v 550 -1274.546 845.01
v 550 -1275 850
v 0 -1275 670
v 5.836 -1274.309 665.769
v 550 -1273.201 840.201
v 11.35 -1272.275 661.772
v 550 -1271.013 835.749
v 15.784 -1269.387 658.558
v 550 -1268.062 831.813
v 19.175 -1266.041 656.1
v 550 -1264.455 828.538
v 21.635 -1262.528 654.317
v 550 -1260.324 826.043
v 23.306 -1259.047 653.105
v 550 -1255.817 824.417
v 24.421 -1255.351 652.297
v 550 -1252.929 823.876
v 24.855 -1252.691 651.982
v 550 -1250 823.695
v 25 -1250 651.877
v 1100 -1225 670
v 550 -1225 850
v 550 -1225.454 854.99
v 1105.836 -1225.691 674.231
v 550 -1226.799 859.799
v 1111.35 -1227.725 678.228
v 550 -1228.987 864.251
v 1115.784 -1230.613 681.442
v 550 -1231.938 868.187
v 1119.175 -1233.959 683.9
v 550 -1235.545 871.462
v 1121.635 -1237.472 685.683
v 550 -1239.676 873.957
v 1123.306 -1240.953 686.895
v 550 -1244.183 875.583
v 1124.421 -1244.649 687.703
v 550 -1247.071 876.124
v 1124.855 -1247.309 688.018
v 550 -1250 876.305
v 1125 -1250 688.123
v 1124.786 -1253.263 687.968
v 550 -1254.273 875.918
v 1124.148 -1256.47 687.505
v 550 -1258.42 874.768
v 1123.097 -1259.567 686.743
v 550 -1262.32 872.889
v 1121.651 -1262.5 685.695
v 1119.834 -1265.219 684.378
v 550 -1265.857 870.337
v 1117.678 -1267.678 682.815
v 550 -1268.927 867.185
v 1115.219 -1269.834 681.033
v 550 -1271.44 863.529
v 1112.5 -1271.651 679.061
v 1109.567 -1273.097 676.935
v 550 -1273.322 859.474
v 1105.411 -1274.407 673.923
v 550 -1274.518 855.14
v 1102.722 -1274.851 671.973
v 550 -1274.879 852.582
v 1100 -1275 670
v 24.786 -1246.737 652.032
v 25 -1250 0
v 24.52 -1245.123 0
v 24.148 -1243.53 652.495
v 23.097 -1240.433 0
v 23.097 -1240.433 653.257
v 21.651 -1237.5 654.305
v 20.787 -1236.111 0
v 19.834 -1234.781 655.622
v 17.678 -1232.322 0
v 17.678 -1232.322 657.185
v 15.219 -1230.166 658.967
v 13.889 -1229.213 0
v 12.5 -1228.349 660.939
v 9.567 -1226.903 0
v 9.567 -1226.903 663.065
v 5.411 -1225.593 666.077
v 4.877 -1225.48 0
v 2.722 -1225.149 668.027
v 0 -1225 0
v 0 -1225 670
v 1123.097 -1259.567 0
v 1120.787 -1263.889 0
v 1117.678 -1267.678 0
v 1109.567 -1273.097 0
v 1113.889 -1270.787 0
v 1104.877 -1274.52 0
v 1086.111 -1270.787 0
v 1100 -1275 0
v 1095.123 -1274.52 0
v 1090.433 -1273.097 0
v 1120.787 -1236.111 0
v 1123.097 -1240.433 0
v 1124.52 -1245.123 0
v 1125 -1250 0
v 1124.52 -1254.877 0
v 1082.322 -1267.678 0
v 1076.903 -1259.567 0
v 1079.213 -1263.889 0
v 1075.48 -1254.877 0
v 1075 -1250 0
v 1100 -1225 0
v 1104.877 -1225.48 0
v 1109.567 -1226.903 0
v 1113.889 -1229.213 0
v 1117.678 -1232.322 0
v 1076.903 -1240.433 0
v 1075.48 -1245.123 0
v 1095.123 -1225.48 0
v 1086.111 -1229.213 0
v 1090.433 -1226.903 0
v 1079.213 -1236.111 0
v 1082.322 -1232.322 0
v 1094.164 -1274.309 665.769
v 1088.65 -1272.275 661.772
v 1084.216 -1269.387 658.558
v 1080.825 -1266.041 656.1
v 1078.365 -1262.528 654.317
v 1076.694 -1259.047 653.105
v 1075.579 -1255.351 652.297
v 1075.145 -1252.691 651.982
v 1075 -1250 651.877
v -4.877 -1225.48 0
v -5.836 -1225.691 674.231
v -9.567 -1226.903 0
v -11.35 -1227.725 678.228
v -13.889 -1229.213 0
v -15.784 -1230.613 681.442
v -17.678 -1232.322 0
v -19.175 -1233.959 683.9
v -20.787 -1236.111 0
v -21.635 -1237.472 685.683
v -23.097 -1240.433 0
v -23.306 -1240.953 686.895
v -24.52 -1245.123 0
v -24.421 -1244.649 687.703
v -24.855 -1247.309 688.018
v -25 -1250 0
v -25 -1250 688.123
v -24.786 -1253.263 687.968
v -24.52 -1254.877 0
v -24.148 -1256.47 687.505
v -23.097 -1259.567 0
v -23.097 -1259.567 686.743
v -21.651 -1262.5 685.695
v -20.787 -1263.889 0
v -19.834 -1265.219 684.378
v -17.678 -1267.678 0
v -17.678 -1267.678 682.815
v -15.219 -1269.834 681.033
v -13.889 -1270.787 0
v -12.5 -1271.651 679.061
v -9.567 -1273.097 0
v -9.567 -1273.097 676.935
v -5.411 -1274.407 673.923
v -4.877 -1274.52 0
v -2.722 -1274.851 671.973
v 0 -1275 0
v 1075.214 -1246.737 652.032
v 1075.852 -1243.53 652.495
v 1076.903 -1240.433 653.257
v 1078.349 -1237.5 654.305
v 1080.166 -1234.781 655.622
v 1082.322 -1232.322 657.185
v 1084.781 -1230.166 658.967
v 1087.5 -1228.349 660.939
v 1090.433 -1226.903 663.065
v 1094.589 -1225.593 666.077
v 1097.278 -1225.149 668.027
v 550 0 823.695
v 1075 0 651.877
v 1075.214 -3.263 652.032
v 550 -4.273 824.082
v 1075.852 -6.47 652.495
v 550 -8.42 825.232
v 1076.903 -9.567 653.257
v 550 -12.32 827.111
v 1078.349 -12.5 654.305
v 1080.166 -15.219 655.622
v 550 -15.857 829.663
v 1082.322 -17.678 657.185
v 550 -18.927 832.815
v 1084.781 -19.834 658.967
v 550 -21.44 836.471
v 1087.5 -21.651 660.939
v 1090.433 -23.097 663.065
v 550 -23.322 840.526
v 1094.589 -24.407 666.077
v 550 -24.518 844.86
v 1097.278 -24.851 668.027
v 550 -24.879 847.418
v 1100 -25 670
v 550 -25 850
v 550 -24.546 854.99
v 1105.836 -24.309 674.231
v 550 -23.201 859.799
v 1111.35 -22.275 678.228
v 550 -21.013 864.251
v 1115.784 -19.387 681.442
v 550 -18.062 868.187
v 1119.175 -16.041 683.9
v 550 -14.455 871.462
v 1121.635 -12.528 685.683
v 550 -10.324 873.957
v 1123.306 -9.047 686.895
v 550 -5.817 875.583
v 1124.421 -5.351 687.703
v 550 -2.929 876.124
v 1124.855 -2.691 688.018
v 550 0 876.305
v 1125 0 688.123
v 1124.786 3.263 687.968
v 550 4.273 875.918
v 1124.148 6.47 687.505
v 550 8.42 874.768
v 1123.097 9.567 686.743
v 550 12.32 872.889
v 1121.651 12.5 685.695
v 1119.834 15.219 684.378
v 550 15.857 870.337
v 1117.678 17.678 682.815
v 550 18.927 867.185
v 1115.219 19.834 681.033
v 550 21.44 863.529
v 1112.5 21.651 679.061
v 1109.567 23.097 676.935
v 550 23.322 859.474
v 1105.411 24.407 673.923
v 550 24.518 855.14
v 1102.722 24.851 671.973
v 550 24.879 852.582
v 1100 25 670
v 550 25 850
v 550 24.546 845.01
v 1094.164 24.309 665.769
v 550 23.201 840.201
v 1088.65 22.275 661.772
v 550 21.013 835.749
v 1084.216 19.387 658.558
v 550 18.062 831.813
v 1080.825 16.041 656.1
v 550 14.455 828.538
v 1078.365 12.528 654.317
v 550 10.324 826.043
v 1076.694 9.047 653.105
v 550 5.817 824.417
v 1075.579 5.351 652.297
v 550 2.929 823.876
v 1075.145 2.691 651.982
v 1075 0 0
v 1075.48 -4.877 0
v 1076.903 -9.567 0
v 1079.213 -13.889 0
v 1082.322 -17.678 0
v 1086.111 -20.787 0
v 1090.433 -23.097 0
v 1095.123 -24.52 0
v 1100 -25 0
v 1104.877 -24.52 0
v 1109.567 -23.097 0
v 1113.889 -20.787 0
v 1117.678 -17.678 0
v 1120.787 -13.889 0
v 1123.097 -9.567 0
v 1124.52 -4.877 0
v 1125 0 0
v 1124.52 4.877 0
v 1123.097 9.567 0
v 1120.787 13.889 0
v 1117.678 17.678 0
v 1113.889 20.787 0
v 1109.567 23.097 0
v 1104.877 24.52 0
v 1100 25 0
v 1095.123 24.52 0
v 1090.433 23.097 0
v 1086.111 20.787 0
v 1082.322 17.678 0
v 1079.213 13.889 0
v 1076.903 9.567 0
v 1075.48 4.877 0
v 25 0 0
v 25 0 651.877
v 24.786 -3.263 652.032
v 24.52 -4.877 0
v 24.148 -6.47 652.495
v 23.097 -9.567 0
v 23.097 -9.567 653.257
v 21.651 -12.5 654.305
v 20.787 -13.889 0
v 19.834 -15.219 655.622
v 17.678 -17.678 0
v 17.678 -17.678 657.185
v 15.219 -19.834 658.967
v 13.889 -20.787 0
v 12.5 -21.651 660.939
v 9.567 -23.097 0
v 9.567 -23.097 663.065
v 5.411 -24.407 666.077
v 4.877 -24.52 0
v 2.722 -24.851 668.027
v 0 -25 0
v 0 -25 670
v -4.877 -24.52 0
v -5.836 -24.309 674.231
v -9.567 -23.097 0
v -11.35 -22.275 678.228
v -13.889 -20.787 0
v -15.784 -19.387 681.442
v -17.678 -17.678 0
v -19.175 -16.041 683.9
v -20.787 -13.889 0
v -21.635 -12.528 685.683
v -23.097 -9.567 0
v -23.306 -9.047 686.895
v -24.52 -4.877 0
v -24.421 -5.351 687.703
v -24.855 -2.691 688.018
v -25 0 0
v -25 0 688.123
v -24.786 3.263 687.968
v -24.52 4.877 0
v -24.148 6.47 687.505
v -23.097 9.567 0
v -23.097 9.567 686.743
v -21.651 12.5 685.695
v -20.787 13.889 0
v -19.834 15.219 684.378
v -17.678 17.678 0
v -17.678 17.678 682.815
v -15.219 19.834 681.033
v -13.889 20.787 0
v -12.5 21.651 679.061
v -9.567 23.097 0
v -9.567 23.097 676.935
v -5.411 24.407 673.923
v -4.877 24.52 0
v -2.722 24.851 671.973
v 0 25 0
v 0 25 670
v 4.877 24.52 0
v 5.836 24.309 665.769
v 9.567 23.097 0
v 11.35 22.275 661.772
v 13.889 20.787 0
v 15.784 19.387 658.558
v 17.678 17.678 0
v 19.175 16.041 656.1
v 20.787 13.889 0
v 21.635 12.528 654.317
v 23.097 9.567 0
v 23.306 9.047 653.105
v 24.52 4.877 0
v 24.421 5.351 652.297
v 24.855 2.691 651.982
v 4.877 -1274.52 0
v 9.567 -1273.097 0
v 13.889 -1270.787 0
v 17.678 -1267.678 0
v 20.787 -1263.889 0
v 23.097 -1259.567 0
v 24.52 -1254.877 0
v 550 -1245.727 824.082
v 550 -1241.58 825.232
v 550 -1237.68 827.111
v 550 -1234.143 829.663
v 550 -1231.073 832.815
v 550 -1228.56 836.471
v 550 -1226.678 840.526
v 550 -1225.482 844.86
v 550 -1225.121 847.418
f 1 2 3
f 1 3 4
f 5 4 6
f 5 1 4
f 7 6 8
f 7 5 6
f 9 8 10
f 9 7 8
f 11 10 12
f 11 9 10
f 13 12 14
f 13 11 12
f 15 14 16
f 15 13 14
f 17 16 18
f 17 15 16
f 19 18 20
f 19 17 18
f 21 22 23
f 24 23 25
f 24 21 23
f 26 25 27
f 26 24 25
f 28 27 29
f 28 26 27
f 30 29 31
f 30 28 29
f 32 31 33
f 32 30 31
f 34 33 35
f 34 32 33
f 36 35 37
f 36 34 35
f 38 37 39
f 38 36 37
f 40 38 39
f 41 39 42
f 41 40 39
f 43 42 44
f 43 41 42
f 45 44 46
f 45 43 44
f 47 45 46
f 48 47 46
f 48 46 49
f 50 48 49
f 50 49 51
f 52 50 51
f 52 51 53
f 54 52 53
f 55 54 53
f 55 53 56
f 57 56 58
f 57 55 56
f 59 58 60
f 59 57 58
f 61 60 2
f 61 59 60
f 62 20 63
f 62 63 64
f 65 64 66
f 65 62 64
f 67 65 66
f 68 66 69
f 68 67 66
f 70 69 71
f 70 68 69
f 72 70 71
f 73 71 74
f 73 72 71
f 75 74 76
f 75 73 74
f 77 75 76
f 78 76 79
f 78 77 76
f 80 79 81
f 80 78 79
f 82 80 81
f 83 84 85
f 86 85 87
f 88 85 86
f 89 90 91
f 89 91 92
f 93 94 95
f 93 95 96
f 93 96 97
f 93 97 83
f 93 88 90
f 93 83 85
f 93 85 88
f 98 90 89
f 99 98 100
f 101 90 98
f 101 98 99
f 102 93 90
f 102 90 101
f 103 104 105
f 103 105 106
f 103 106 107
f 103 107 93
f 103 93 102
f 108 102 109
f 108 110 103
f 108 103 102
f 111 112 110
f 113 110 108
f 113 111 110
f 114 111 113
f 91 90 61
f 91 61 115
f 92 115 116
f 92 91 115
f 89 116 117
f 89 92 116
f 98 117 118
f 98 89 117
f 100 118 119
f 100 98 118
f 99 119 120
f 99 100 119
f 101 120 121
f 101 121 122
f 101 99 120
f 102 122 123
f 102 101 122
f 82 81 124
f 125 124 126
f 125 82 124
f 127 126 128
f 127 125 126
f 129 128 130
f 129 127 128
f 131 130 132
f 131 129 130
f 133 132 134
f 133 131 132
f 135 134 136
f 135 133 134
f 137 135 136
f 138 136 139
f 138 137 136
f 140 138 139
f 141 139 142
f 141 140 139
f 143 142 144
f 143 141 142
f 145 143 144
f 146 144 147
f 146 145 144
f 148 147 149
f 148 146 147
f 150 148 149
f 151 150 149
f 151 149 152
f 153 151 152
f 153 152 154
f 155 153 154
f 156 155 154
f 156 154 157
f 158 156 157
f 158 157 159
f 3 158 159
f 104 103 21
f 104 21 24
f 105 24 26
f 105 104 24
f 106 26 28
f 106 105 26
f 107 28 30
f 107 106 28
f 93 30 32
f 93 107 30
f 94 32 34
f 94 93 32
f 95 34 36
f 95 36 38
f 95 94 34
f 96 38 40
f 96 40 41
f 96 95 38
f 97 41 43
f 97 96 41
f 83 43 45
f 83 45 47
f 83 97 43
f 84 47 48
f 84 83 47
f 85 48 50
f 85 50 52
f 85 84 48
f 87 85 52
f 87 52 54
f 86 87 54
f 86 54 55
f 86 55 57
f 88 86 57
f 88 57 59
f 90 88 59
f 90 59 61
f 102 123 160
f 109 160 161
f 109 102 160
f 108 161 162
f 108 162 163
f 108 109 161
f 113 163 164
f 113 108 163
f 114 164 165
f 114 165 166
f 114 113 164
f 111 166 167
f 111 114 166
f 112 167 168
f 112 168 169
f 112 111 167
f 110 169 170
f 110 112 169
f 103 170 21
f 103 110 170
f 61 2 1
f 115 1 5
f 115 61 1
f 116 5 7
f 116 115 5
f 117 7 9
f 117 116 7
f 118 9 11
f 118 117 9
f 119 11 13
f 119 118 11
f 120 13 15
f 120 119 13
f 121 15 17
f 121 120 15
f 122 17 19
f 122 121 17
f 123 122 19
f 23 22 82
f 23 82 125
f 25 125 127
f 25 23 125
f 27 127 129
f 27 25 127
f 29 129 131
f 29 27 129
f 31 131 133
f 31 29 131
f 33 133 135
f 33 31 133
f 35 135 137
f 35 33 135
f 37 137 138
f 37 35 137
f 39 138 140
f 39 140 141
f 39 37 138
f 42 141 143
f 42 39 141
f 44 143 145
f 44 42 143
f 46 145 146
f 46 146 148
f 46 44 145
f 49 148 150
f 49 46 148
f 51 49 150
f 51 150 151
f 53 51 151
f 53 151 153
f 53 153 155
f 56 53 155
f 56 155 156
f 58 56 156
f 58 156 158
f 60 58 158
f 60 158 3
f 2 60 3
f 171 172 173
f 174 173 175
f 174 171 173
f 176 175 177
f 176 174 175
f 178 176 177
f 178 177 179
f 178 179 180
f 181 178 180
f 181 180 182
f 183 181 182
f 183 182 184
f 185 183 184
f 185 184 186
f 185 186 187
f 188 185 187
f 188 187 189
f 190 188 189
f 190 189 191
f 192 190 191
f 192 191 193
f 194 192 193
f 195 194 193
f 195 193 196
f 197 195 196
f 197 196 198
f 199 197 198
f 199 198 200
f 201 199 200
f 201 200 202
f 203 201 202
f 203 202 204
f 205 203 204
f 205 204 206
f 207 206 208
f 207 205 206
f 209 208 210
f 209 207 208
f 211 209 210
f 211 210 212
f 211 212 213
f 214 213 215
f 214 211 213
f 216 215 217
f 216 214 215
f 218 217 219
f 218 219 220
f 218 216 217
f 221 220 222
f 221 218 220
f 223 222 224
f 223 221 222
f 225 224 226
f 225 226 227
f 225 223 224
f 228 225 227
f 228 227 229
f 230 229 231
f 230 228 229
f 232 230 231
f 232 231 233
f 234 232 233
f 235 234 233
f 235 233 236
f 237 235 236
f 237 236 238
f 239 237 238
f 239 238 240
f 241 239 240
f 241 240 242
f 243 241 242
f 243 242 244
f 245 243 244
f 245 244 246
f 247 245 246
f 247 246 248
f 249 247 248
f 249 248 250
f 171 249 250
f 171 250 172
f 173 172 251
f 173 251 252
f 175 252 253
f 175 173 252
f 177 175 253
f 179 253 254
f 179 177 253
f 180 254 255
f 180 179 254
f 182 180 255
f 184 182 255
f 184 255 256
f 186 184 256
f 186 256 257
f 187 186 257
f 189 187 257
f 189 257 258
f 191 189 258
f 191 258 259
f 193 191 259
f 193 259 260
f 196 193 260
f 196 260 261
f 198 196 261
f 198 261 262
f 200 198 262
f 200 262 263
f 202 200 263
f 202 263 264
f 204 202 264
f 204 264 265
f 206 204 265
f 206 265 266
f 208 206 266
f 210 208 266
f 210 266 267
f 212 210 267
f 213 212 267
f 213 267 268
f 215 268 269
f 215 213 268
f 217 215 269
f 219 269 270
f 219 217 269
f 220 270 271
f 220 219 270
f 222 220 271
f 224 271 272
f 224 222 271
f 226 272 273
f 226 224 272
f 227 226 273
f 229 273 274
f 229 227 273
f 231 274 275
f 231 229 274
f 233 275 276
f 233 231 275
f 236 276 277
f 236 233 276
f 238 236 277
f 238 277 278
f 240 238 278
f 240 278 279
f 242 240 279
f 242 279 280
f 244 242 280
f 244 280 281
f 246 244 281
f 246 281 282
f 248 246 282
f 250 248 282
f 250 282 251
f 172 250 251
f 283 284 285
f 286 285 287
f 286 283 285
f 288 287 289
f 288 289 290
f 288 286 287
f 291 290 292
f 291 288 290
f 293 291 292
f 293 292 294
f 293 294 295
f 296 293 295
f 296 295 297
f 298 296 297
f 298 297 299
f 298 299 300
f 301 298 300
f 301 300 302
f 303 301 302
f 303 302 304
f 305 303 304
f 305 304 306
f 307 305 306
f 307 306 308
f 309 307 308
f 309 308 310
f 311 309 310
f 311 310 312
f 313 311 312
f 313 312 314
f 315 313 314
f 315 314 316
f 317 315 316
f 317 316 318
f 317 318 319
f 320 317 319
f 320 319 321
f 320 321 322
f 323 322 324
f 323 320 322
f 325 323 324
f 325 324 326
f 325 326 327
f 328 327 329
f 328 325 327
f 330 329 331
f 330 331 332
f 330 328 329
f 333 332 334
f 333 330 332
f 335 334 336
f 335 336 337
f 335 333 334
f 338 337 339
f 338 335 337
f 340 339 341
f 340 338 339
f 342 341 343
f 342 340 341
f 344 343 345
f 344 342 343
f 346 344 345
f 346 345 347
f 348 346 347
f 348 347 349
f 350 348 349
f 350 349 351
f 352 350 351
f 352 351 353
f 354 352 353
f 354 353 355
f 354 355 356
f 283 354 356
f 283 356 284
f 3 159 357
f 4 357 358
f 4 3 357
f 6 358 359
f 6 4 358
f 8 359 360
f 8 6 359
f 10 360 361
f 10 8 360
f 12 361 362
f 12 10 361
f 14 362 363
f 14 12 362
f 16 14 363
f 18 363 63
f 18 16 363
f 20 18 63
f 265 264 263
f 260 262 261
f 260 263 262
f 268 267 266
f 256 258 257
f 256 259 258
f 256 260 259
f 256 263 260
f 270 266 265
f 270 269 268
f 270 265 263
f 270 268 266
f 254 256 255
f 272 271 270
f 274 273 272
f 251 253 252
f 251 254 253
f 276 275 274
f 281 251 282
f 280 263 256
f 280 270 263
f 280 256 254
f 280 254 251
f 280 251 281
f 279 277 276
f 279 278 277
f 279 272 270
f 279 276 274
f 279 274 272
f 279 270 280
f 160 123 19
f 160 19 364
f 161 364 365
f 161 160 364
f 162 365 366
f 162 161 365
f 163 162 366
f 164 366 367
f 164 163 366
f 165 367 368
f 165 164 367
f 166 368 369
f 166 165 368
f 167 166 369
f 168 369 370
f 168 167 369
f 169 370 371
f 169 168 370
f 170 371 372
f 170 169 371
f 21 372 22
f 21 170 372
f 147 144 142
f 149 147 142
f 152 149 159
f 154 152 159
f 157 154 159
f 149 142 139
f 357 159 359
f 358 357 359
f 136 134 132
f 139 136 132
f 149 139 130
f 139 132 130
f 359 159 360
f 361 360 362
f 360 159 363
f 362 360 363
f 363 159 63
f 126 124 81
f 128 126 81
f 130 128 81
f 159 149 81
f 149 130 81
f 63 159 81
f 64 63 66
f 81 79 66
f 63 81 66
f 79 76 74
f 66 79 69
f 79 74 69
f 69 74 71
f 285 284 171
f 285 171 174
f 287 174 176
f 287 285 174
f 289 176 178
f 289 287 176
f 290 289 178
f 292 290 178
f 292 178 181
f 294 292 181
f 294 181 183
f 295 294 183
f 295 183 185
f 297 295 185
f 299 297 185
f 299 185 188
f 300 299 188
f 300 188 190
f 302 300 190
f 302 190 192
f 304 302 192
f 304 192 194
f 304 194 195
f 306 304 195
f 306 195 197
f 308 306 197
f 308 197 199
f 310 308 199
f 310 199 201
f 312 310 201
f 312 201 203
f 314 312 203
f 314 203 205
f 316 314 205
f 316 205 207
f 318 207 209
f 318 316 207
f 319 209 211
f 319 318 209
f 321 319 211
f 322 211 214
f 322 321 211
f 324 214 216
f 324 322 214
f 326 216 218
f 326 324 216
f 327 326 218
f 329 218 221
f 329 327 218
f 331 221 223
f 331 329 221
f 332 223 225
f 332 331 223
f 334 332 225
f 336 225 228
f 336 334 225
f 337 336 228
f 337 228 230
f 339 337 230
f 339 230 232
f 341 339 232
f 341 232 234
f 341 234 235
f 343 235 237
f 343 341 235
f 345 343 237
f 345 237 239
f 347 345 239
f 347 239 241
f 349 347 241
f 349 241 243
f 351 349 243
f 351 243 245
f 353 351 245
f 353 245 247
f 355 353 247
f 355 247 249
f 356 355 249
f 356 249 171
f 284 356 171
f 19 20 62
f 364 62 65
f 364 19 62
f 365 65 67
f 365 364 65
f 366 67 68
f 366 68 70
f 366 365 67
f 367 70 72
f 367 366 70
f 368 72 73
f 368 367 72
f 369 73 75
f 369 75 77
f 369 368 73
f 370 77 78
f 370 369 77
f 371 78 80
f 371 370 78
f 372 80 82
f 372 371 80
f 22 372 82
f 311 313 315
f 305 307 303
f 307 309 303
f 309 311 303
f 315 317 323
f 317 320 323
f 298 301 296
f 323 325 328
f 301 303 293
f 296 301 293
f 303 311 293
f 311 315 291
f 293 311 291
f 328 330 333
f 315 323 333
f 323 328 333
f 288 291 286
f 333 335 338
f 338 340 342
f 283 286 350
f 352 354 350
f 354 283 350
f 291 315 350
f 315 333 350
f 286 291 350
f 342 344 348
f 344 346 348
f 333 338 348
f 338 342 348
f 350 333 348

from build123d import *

# Parameters (mm, degrees)
F1_R = 25


with BuildPart() as f10:
    # F10: sweep along a path in F0
    with BuildLine(Plane.XZ) as f10_path:
        Line((1100, 0), (1100, 670))
        Line((1100, 670), (550, 850))
        Line((550, 850), (0, 670))
        Line((0, 670), (0, 0))
    # F1 (on Top) → F10 (sweep)
    with BuildSketch(Plane.XY):
        Circle(F1_R)
    sweep(path=f10_path.line, transition=Transition.RIGHT)


with BuildPart() as f13:
    # F13: sweep along a path in F5
    with BuildLine(Plane.XZ.offset(1250)) as f13_path:
        Line((0, 0), (0, 670))
        Line((0, 670), (550, 850))
        Line((550, 850), (1100, 670))
        Line((1100, 670), (1100, 0))
    # F12 (on plane+point) → F13 (sweep)
    with BuildSketch(Plane.XY):
        with BuildLine():
            ThreePointArc((25, -1250), (17.6776695297, -1232.3223304703), (0, -1225))
            Line((0, -1225), (0, -1250))
            Line((0, -1250), (0, -1275))
            ThreePointArc((0, -1275), (17.6776695297, -1267.6776695297), (25, -1250))
        make_face()
        with BuildLine():
            Line((0, -1250), (0, -1225))
            ThreePointArc((0, -1225), (-25, -1250), (0, -1275))
            Line((0, -1275), (0, -1250))
        make_face()
    sweep(path=f13_path.line, transition=Transition.RIGHT)


solid = Compound([f10.part, f13.part])
